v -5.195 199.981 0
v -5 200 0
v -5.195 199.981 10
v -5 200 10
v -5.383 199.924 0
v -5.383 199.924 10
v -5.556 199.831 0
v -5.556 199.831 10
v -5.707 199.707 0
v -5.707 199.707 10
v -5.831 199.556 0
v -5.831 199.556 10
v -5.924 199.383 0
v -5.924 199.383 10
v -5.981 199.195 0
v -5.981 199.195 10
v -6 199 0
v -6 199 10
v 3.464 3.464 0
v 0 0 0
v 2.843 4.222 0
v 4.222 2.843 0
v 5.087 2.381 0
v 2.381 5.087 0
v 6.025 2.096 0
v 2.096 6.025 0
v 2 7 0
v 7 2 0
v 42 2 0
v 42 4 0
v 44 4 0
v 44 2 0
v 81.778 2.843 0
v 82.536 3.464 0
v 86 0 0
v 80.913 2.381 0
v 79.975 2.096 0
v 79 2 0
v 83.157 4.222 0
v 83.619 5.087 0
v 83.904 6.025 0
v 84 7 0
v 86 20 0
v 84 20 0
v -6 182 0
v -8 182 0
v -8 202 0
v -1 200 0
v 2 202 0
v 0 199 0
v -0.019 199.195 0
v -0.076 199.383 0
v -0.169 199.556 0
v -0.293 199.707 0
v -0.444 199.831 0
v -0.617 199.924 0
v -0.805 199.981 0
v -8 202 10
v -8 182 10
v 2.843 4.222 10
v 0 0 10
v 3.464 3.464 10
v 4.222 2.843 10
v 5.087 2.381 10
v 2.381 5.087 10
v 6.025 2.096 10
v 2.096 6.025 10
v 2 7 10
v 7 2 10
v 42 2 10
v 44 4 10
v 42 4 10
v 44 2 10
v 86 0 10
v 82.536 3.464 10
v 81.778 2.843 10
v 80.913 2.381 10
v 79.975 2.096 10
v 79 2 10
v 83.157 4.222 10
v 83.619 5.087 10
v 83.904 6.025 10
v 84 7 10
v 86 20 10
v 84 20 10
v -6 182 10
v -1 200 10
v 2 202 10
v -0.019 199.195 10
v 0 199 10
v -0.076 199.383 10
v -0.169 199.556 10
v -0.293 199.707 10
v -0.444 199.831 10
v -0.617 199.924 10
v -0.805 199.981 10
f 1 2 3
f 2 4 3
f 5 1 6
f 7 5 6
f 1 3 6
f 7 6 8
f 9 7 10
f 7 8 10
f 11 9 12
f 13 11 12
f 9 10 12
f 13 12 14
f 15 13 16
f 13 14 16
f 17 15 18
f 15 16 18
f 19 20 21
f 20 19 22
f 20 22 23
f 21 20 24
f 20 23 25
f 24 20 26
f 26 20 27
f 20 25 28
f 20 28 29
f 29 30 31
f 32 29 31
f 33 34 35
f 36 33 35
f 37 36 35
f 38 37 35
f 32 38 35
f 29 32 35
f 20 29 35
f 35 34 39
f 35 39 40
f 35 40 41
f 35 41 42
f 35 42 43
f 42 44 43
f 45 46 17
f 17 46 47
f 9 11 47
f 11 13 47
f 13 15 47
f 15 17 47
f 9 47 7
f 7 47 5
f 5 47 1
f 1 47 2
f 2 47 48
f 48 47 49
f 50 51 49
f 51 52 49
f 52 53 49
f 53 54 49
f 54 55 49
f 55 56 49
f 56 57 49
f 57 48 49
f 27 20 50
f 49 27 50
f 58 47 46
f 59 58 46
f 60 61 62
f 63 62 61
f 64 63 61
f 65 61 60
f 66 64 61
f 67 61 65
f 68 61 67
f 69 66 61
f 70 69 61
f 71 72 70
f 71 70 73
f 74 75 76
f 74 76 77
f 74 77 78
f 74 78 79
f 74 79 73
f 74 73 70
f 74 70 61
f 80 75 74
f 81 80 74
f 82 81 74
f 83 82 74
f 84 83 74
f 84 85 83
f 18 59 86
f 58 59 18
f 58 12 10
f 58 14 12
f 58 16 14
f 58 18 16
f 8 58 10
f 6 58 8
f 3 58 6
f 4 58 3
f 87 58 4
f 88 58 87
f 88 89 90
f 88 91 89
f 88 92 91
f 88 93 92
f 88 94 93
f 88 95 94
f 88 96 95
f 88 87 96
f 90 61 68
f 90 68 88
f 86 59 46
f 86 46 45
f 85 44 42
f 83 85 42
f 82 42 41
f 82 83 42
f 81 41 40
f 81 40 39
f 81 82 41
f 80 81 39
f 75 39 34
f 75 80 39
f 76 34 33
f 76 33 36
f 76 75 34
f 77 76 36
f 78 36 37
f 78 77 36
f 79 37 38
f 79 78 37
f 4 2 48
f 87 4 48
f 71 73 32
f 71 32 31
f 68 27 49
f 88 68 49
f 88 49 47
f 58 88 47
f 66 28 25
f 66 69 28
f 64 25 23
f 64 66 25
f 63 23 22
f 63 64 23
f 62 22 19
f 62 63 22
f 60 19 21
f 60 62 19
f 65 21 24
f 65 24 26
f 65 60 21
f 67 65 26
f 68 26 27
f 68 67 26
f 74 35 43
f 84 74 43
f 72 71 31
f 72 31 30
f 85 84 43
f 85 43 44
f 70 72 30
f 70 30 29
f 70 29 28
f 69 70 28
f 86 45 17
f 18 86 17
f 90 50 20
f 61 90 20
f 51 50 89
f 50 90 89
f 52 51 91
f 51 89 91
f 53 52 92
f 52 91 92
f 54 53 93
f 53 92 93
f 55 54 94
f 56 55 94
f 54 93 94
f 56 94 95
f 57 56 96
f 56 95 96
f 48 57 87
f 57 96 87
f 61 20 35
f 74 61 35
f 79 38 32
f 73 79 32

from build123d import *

# Parameters (mm, degrees)
F1_DEPTH = 10
F2_R     = 5
F3_R     = 1


with BuildPart() as f1:
    # F0 (on Top) → F1 (new body)
    with BuildSketch(Plane.XY):
        Polygon((-8, 182), (-6, 182), (-6, 200), (0, 200), (0, 0), (86, 0), (86, 20), (84, 20), (84, 2), (44, 2), (44, 4), (42, 4), (42, 2), (2, 2), (2, 202), (-8, 202), align=None)
    extrude(amount=F1_DEPTH)

    # F2
    f2_edges = [f1.edges().sort_by_distance(p)[0] for p in [
        (2, 2, 5),
        (84, 2, 5),
    ]]
    fillet(f2_edges, radius=F2_R)

    # F3
    f3_edges = [f1.edges().sort_by_distance(p)[0] for p in [
        (-6, 200, 5),
        (0, 200, 5),
    ]]
    fillet(f3_edges, radius=F3_R)


solid = f1.part
